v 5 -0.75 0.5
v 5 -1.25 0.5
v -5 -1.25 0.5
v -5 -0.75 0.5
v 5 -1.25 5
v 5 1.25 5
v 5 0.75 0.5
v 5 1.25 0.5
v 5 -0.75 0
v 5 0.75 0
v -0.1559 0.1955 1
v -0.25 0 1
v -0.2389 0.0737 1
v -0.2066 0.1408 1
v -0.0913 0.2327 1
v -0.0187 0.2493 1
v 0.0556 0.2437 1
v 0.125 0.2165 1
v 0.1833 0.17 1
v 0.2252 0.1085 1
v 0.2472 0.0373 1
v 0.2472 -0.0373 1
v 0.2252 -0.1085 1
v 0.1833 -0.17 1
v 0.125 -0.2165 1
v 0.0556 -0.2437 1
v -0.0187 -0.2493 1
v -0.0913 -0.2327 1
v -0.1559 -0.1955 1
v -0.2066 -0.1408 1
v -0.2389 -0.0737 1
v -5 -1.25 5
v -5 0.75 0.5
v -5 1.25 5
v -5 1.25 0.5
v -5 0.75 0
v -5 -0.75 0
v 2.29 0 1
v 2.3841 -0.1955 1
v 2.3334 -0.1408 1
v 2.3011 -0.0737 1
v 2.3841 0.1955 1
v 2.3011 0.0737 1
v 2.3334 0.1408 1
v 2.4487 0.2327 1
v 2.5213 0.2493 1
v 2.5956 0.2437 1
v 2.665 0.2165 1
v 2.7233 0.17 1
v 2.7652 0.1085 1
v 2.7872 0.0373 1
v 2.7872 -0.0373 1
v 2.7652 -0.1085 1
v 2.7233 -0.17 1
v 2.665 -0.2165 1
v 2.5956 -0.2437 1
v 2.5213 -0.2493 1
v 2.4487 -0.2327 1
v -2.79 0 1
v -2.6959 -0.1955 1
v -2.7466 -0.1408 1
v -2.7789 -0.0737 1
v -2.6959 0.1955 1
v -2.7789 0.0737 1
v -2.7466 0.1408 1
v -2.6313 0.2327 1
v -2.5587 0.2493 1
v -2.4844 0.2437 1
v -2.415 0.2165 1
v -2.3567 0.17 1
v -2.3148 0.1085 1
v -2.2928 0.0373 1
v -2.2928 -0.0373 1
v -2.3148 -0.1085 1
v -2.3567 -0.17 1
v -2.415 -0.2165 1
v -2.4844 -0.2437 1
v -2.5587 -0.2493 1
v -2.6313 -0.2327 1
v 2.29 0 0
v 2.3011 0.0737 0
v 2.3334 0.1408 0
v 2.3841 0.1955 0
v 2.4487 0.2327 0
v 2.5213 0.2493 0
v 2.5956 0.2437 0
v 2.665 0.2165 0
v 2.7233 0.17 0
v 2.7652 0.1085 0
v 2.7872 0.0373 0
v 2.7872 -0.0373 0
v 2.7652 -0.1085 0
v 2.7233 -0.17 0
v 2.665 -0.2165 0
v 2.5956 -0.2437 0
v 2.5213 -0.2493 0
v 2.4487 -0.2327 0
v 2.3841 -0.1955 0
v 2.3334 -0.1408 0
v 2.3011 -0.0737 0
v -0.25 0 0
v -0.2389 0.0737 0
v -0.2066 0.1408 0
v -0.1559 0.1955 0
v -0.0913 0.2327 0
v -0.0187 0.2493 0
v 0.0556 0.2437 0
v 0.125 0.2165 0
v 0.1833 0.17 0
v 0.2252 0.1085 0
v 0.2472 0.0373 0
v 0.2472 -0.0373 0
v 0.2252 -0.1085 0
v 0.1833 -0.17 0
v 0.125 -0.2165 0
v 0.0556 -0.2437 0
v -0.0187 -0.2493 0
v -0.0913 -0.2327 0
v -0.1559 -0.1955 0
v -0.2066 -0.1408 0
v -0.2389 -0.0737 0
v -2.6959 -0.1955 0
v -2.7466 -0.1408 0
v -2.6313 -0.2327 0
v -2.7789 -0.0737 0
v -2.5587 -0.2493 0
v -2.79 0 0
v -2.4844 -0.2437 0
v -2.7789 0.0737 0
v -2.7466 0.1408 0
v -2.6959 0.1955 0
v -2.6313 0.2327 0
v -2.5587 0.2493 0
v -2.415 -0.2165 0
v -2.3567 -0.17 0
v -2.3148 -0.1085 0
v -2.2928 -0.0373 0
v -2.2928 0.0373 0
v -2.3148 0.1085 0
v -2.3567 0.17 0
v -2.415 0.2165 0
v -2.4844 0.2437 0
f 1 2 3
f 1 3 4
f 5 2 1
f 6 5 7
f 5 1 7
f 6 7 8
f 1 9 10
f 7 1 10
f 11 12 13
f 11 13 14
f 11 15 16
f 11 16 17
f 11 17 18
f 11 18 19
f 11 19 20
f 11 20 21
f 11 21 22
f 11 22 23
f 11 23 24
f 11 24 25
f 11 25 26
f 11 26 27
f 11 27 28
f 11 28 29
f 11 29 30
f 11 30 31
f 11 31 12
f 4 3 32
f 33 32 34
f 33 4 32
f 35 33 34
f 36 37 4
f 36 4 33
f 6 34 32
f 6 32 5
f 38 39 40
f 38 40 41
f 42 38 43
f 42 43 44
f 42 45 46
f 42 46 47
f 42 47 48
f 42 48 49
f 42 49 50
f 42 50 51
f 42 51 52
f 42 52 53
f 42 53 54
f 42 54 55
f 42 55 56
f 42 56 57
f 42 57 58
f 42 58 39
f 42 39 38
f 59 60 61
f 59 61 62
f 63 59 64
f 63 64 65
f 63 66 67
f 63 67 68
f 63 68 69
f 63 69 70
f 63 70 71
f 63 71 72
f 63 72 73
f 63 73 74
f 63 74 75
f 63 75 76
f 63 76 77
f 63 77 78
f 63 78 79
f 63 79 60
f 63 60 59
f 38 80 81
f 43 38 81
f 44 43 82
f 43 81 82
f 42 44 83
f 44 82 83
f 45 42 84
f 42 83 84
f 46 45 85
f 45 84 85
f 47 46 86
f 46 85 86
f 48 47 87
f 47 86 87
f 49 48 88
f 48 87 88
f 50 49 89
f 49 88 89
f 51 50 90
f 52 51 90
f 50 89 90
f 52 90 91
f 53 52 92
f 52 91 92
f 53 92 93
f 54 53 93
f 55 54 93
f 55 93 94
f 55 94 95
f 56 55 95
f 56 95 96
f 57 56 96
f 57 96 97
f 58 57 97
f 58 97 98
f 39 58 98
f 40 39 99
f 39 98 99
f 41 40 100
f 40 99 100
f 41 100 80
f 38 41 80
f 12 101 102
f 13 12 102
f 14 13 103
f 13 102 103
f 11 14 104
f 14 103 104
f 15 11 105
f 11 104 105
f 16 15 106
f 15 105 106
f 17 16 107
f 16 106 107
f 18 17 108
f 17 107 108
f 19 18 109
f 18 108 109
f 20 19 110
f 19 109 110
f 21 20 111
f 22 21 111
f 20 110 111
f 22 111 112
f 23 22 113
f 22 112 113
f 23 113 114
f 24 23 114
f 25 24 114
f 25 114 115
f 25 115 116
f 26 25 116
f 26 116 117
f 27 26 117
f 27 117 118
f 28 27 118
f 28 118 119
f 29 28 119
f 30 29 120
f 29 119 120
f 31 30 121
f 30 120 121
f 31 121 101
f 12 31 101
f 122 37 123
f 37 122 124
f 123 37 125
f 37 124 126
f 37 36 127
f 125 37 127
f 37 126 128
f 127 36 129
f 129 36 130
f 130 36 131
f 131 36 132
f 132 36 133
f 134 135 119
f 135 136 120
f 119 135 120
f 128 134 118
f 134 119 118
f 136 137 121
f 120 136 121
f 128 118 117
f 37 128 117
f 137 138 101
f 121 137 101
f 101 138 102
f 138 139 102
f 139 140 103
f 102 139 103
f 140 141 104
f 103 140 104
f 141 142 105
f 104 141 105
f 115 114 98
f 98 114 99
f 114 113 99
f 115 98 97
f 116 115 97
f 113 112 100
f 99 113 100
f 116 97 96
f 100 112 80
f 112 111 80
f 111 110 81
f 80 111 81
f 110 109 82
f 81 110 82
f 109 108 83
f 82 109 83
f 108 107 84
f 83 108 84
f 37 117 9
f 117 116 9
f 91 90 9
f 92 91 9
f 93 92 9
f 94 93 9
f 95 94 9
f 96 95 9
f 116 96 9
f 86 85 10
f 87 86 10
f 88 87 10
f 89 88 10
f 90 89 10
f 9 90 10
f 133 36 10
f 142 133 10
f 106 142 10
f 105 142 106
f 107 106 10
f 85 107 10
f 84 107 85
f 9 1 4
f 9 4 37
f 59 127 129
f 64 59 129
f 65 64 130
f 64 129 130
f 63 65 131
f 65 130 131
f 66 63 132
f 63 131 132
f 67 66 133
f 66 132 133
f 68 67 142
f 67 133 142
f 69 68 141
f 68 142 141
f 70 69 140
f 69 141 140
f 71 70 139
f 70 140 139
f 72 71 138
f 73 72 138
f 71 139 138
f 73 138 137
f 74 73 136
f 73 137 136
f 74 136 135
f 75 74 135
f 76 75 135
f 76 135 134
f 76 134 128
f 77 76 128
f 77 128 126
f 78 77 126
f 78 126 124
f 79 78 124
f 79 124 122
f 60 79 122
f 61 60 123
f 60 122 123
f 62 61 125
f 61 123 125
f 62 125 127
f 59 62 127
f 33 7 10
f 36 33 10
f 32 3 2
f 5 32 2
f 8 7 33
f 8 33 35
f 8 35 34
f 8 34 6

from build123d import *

# Parameters (mm, degrees)
SKICA1_W                 = 10
SKICA1_H                 = 2.5
P_IDAT_VYSUNUT_M1_DEPTH  = 5
SKICA2_W                 = 0.5
SKICA2_H                 = 0.5
ODEBRAT_VYSUNUT_M1_DEPTH = 11
SKICA3_R                 = 0.25
ODEBRAT_VYSUNUT_M2_DEPTH = 1


with BuildPart() as part:
    # Skica1 → Přidat vysunutím1 (new body)
    with BuildSketch(Plane.XY):
        Rectangle(SKICA1_W, SKICA1_H)
    extrude(amount=P_IDAT_VYSUNUT_M1_DEPTH)

    # Skica2 → Odebrat vysunutím1 (cut, through all)
    with BuildSketch(Plane(origin=(5, 0, 0), x_dir=(0, 0, -1), z_dir=(1, 0, 0))):
        with Locations((-0.25, 1)):
            Rectangle(SKICA2_W, SKICA2_H)
        with Locations((-0.25, -1)):
            Rectangle(SKICA2_W, SKICA2_H)
    extrude(amount=-ODEBRAT_VYSUNUT_M1_DEPTH, mode=Mode.SUBTRACT)

    # Skica3 → Odebrat vysunutím2 (cut)
    with BuildSketch(Plane(origin=(0, 0, 0), x_dir=(-1, 0, 0), z_dir=(0, 0, -1))):
        Circle(SKICA3_R)
        with Locations((-2.54, 0)):
            Circle(SKICA3_R)
        with Locations((2.54, 0)):
            Circle(SKICA3_R)
    extrude(amount=-ODEBRAT_VYSUNUT_M2_DEPTH, mode=Mode.SUBTRACT)


solid = part.part
